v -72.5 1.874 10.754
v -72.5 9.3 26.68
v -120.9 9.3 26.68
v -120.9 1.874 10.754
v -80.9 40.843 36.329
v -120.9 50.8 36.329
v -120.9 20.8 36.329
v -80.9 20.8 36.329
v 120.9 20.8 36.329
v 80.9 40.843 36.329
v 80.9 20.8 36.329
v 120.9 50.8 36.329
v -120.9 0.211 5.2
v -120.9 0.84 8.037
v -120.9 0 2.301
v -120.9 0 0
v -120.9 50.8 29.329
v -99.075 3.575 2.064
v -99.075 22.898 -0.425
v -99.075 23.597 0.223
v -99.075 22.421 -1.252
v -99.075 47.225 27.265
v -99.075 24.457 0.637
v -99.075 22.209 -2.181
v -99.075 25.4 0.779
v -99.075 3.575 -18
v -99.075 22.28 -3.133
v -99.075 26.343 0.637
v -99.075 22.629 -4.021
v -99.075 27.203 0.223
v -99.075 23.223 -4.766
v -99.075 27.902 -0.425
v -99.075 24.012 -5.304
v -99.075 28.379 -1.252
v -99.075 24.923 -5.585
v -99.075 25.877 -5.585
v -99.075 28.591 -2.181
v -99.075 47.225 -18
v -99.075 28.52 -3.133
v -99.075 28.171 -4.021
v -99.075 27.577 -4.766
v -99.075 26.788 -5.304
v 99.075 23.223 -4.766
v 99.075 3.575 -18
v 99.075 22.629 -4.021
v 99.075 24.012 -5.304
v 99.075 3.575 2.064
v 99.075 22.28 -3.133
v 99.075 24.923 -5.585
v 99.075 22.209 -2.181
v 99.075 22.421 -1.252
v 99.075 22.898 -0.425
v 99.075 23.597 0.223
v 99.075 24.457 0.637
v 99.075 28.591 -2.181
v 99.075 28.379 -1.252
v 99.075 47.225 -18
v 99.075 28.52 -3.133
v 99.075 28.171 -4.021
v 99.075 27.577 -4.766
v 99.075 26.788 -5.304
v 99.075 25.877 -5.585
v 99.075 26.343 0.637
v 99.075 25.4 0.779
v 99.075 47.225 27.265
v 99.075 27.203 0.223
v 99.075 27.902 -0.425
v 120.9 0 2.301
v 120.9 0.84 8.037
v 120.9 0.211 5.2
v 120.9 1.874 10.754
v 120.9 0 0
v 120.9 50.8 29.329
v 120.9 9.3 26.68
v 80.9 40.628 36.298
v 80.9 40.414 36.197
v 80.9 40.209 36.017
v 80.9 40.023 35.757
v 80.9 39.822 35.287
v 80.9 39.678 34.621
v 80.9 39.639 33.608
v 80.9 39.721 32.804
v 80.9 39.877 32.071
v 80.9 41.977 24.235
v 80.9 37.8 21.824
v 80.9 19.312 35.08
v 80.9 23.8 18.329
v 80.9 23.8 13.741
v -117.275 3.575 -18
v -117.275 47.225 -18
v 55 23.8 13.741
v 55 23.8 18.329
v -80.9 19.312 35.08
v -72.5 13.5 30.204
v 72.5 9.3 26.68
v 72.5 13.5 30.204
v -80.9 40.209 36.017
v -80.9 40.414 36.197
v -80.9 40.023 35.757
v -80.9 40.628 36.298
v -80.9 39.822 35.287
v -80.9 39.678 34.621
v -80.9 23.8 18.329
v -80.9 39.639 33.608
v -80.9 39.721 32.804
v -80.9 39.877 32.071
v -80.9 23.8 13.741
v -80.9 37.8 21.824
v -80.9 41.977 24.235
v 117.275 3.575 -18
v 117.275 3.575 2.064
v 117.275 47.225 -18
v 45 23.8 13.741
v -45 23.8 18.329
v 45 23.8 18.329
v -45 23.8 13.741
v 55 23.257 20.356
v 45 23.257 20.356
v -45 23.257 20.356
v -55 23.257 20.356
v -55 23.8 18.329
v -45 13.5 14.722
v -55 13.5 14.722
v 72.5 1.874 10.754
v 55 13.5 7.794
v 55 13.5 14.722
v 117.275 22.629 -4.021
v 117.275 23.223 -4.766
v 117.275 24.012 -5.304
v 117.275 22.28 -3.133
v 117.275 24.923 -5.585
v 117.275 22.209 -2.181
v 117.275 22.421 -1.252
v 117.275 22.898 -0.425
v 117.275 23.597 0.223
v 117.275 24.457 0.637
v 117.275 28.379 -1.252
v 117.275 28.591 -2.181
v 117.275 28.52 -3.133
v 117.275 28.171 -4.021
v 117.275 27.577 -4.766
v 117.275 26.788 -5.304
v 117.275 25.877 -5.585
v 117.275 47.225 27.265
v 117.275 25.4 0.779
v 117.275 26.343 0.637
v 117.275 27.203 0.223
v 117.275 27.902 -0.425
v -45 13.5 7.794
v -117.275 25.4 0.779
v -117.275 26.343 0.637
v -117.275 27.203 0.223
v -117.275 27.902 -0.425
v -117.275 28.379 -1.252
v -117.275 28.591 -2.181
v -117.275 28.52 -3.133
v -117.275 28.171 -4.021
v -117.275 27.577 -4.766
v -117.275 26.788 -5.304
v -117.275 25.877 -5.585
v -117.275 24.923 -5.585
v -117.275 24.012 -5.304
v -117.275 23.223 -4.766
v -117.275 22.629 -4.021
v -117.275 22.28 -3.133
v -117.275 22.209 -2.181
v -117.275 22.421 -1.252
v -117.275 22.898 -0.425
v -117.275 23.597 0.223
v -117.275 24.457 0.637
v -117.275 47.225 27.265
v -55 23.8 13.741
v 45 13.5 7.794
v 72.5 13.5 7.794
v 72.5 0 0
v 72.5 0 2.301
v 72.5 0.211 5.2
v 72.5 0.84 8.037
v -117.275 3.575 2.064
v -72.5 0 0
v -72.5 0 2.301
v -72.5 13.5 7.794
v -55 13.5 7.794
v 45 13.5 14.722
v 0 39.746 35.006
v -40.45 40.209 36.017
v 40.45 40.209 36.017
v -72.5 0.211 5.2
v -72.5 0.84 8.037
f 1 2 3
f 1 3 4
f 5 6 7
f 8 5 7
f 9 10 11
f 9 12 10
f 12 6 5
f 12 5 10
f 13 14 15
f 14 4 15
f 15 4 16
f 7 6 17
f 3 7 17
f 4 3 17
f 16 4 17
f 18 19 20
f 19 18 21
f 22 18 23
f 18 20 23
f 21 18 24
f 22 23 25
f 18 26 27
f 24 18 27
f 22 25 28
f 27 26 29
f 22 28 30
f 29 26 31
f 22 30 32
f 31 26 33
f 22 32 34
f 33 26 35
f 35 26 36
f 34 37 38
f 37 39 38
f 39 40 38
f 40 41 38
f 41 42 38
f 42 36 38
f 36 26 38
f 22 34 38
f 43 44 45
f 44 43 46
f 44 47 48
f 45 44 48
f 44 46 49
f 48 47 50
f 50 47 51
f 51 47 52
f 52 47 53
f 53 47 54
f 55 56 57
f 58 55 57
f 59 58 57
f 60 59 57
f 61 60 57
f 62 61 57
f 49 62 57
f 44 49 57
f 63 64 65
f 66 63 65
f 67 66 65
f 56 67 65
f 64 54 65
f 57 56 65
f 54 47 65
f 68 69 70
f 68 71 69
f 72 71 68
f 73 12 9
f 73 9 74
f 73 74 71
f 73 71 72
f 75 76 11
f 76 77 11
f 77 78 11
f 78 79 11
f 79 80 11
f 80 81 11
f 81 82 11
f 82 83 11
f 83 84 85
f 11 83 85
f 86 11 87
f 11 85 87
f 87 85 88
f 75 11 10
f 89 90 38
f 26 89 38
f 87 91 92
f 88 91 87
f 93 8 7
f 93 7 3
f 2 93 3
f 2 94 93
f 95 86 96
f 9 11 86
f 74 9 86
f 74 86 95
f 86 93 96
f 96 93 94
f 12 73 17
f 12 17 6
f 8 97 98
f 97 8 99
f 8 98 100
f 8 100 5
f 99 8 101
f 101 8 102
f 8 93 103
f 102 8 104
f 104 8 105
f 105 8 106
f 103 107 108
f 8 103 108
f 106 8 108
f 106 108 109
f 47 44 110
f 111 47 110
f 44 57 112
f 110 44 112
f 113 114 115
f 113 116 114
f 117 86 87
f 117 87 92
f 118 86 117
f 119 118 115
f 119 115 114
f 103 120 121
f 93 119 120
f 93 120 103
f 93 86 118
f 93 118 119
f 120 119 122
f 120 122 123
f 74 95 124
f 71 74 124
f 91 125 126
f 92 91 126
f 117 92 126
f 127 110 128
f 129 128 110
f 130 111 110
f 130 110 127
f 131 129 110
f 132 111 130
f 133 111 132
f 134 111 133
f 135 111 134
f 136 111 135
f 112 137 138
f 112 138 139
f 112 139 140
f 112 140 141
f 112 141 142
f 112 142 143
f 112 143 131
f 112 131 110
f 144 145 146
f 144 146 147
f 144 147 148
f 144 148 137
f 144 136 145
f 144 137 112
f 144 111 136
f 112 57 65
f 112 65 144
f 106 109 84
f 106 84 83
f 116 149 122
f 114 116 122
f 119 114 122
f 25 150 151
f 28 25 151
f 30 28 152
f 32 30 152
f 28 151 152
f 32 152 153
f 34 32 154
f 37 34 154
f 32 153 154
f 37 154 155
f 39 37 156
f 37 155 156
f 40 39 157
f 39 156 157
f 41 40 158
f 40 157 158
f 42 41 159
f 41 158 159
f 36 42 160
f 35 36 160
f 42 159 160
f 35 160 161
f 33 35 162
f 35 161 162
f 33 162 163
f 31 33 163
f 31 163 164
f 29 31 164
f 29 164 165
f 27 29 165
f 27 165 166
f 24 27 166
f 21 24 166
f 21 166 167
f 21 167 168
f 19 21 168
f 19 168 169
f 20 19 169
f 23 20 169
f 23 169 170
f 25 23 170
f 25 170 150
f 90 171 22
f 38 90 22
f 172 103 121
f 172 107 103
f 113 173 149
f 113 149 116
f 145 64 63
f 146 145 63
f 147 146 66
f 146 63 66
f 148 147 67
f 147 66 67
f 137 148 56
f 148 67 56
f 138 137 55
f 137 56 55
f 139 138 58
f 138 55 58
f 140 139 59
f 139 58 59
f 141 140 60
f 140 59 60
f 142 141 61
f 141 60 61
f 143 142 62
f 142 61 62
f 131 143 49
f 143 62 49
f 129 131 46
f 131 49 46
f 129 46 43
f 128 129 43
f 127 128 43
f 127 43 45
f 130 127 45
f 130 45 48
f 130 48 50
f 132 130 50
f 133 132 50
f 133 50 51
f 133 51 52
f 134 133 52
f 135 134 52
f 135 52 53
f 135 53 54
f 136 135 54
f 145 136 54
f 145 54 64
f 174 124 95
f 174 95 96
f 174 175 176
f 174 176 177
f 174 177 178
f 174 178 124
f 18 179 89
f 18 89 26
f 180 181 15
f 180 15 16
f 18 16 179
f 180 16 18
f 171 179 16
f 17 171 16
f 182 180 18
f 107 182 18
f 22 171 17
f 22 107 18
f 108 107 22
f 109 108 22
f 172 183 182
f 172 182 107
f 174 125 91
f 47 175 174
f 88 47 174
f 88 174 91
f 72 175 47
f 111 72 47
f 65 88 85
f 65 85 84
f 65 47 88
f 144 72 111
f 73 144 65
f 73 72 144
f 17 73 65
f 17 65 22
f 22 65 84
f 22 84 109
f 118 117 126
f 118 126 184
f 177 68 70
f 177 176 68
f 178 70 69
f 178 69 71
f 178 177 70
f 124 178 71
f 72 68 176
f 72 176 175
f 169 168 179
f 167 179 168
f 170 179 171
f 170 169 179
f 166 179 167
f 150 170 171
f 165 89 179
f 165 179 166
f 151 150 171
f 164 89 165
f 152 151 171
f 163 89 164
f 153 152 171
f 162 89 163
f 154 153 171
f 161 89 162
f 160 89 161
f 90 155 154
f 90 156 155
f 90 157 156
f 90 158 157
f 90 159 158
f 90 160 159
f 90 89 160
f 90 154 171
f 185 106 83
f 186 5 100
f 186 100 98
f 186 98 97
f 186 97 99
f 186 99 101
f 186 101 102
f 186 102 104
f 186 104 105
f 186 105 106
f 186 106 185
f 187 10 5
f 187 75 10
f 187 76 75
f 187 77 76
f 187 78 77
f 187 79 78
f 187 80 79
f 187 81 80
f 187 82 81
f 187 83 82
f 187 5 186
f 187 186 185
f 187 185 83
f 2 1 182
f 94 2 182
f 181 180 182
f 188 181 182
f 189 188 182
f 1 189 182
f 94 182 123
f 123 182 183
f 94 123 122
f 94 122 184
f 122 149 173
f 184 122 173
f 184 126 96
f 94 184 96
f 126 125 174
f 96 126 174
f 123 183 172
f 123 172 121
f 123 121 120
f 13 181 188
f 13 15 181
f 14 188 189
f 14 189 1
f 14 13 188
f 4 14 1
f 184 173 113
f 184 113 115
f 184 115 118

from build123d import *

# Parameters (mm, degrees)
BOSS_EXTRUDE2_DEPTH             = 120.9
BOSS_EXTRUDE1_REACH             = 138.078
SKETCH2_W                       = 18.2
SKETCH2_H                       = 43.65
BOSS_EXTRUDE1_DIRECTION_2_DEPTH = 18
M6_CLEARANCE_HOLE1_D            = 6.4
CUT_EXTRUDE6_DEPTH              = 137.078193862
CUT_EXTRUDE6_DEPTH_BACK         = 137.078193862
SKETCH13_W                      = 145
SKETCH13_H                      = 13.5
SKETCH13_W_2                    = 161.8
SKETCH13_H_2                    = 14
CHAMFER5_SIZE                   = 4.823085464
CHAMFER5_SIZE_2                 = 18
CHAMFER6_SIZE                   = 18
CHAMFER6_SIZE2                  = 4.823085464
CHAMFER7_SIZE                   = 7
CHAMFER7_SIZE_2                 = 10.646755418
CUT_EXTRUDE8_REACH              = 131.701
SKETCH15_W                      = 10
SKETCH15_H                      = 6
FILLET2_R                       = 20


with BuildPart() as part:
    # Sketch1 → Boss-Extrude2 (new, symmetric)
    with BuildSketch(Plane(origin=(0, 0, 0), x_dir=(0, 0, -1), z_dir=(1, 0, 0))):
        Polygon((0, 0), (-29.329393675, 50.8), (-36.329393675, 50.8), (-36.329393675, 13.8), (-6.735198172, 0), align=None)
    extrude(amount=BOSS_EXTRUDE2_DEPTH, both=True)

    # Boss-Extrude1: up to this plane
    boss_extrude1_end = Plane(origin=(120.9, 0, 0), z_dir=(0, -0.5000000000000043, 0.8660254037844363))
    # Sketch2 → Boss-Extrude1 (add, up to the surface)
    with BuildSketch(Plane.XY, mode=Mode.PRIVATE) as boss_extrude1_sk1:
        with Locations((108.175, 25.4)):
            Rectangle(SKETCH2_W, SKETCH2_H)
    boss_extrude1_tool1 = split(extrude(boss_extrude1_sk1.sketch, amount=BOSS_EXTRUDE1_REACH, mode=Mode.PRIVATE), bisect_by=boss_extrude1_end, keep=Keep.BOTH, mode=Mode.PRIVATE)
    add(boss_extrude1_tool1.solids().sort_by_distance((108.175, 25.4, 0))[0])
    # Sketch2 → Boss-Extrude1 (add, up to the surface)
    with BuildSketch(Plane.XY, mode=Mode.PRIVATE) as boss_extrude1_sk2:
        with Locations((-108.175, 25.4)):
            Rectangle(SKETCH2_W, SKETCH2_H)
    boss_extrude1_tool2 = split(extrude(boss_extrude1_sk2.sketch, amount=BOSS_EXTRUDE1_REACH, mode=Mode.PRIVATE), bisect_by=boss_extrude1_end, keep=Keep.BOTH, mode=Mode.PRIVATE)
    add(boss_extrude1_tool2.solids().sort_by_distance((-108.175, 25.4, 0))[0])

    # Sketch2 → Boss-Extrude1 direction 2 (add)
    with BuildSketch(Plane.XY):
        with Locations((108.175, 25.4)):
            Rectangle(SKETCH2_W, SKETCH2_H)
        with Locations((-108.175, 25.4)):
            Rectangle(SKETCH2_W, SKETCH2_H)
    extrude(amount=-BOSS_EXTRUDE1_DIRECTION_2_DEPTH)

    # M6 Clearance Hole1 (through all)
    with Locations(Plane(origin=(117.275, 0, 0), x_dir=(0, 0, -1), z_dir=(1, 0, 0))):
        with Locations((2.420606325, 25.4)):
            Hole(M6_CLEARANCE_HOLE1_D / 2)

    # Sketch13 → Cut-Extrude6 (cut, two sides: drawn at the far end of the back side and taken through both)
    with BuildSketch(Plane.XY.offset(-CUT_EXTRUDE6_DEPTH_BACK)):
        with Locations((0, 6.75)):
            Rectangle(SKETCH13_W, SKETCH13_H)
        with Locations((0, 30.8)):
            Rectangle(SKETCH13_W_2, SKETCH13_H_2)
    extrude(amount=CUT_EXTRUDE6_DEPTH + CUT_EXTRUDE6_DEPTH_BACK, mode=Mode.SUBTRACT)

    # Chamfer5
    # the kernel refuses this chamfer: 18, 4.823085464 mm, written as the material it takes off along each edge
    with BuildSketch(Plane(origin=(80.9, 37.8, 21.823840175), x_dir=(0, 0.9306108519370808, 0.366010166876469), z_dir=(-1, 0, 0))) as chamfer5_piece_1:
        Polygon((CHAMFER5_SIZE * 0.988937722204, -CHAMFER5_SIZE * 0.148331323403), (CHAMFER5_SIZE_2 * 0.366010166876, -CHAMFER5_SIZE_2 * 0.930610851937), (0, 0), align=None)
    extrude(amount=161.8, mode=Mode.SUBTRACT)

    # Chamfer6
    chamfer6_edges = [part.edges().sort_by_distance(p)[0] for p in [
        (0, 23.8, 36.329393675),
    ]]
    chamfer6_side = [part.faces().sort_by_distance(p)[0] for p in [
        (0, 23.8, 25.035165041),
    ]]
    chamfer(chamfer6_edges, length=CHAMFER6_SIZE, length2=CHAMFER6_SIZE2, reference=chamfer6_side[0])

    # Chamfer7
    # the kernel refuses this chamfer: 10.646755418, 7 mm, written as the material it takes off along each edge
    with BuildSketch(Plane(origin=(148.485482138, 13.8, 36.329393675), x_dir=(0, 0.9993026620124821, 0.037338849671180216), z_dir=(-1, 0, 0))) as chamfer7_piece_1:
        Polygon((CHAMFER7_SIZE * 0.999302662012, CHAMFER7_SIZE * 0.0373388496712), (-CHAMFER7_SIZE_2 * 0.456164044176, CHAMFER7_SIZE_2 * 0.88989570442), (0, 0), align=None)
    extrude(amount=296.970964275, mode=Mode.SUBTRACT)

    # Cut-Extrude8: up to this plane
    cut_extrude8_end = Plane(origin=(-80.9, 23.8, 18.329393675), z_dir=(0, -0.965925826289069, -0.25881904510251824))
    # Sketch15 → Cut-Extrude8 (cut, up to the surface)
    with BuildSketch(Plane(origin=(0, 13.5, 7.794228634), x_dir=(-1, 0, 0), z_dir=(0, 0.8660254037844363, 0.5000000000000042)), mode=Mode.PRIVATE) as cut_extrude8_sk1:
        with Locations((-50, 3)):
            Rectangle(SKETCH15_W, SKETCH15_H)
    cut_extrude8_tool1 = split(extrude(cut_extrude8_sk1.sketch, amount=CUT_EXTRUDE8_REACH, mode=Mode.PRIVATE), bisect_by=cut_extrude8_end, keep=Keep.BOTH, mode=Mode.PRIVATE)
    add(cut_extrude8_tool1.solids().sort_by_distance((50, 12, 10.392305))[0], mode=Mode.SUBTRACT)
    # Sketch15 → Cut-Extrude8 (cut, up to the surface)
    with BuildSketch(Plane(origin=(0, 13.5, 7.794228634), x_dir=(-1, 0, 0), z_dir=(0, 0.8660254037844363, 0.5000000000000042)), mode=Mode.PRIVATE) as cut_extrude8_sk2:
        with Locations((50, 3)):
            Rectangle(SKETCH15_W, SKETCH15_H)
    cut_extrude8_tool2 = split(extrude(cut_extrude8_sk2.sketch, amount=CUT_EXTRUDE8_REACH, mode=Mode.PRIVATE), bisect_by=cut_extrude8_end, keep=Keep.BOTH, mode=Mode.PRIVATE)
    add(cut_extrude8_tool2.solids().sort_by_distance((-50, 12, 10.392305))[0], mode=Mode.SUBTRACT)

    # Fillet1
    # an asymmetric fillet: 4, 1 mm, written as the material it takes off along each edge
    with BuildSketch(Plane(origin=(80.9, 38.736334118, 36.329393675), x_dir=(0, 1, 0), z_dir=(-1, 0, 0))) as fillet1_piece_1:
        with BuildLine():
            Bezier((2.10707295, 0), (0, 0), (1.141147124, 4.258819045), weights=[1, 0.608761429, 1])
            Line((1.141147124, 4.258819045), (0, 0))
            Line((0, 0), (2.10707295, 0))
        make_face()
    extrude(amount=161.8, mode=Mode.SUBTRACT)

    # Fillet2
    fillet2_edges = [part.edges().sort_by_distance(p)[0] for p in [
        (-96.7, 0, 6.735198172),
        (96.7, 0, 6.735198172),
    ]]
    fillet(fillet2_edges, radius=FILLET2_R)


solid = part.part
